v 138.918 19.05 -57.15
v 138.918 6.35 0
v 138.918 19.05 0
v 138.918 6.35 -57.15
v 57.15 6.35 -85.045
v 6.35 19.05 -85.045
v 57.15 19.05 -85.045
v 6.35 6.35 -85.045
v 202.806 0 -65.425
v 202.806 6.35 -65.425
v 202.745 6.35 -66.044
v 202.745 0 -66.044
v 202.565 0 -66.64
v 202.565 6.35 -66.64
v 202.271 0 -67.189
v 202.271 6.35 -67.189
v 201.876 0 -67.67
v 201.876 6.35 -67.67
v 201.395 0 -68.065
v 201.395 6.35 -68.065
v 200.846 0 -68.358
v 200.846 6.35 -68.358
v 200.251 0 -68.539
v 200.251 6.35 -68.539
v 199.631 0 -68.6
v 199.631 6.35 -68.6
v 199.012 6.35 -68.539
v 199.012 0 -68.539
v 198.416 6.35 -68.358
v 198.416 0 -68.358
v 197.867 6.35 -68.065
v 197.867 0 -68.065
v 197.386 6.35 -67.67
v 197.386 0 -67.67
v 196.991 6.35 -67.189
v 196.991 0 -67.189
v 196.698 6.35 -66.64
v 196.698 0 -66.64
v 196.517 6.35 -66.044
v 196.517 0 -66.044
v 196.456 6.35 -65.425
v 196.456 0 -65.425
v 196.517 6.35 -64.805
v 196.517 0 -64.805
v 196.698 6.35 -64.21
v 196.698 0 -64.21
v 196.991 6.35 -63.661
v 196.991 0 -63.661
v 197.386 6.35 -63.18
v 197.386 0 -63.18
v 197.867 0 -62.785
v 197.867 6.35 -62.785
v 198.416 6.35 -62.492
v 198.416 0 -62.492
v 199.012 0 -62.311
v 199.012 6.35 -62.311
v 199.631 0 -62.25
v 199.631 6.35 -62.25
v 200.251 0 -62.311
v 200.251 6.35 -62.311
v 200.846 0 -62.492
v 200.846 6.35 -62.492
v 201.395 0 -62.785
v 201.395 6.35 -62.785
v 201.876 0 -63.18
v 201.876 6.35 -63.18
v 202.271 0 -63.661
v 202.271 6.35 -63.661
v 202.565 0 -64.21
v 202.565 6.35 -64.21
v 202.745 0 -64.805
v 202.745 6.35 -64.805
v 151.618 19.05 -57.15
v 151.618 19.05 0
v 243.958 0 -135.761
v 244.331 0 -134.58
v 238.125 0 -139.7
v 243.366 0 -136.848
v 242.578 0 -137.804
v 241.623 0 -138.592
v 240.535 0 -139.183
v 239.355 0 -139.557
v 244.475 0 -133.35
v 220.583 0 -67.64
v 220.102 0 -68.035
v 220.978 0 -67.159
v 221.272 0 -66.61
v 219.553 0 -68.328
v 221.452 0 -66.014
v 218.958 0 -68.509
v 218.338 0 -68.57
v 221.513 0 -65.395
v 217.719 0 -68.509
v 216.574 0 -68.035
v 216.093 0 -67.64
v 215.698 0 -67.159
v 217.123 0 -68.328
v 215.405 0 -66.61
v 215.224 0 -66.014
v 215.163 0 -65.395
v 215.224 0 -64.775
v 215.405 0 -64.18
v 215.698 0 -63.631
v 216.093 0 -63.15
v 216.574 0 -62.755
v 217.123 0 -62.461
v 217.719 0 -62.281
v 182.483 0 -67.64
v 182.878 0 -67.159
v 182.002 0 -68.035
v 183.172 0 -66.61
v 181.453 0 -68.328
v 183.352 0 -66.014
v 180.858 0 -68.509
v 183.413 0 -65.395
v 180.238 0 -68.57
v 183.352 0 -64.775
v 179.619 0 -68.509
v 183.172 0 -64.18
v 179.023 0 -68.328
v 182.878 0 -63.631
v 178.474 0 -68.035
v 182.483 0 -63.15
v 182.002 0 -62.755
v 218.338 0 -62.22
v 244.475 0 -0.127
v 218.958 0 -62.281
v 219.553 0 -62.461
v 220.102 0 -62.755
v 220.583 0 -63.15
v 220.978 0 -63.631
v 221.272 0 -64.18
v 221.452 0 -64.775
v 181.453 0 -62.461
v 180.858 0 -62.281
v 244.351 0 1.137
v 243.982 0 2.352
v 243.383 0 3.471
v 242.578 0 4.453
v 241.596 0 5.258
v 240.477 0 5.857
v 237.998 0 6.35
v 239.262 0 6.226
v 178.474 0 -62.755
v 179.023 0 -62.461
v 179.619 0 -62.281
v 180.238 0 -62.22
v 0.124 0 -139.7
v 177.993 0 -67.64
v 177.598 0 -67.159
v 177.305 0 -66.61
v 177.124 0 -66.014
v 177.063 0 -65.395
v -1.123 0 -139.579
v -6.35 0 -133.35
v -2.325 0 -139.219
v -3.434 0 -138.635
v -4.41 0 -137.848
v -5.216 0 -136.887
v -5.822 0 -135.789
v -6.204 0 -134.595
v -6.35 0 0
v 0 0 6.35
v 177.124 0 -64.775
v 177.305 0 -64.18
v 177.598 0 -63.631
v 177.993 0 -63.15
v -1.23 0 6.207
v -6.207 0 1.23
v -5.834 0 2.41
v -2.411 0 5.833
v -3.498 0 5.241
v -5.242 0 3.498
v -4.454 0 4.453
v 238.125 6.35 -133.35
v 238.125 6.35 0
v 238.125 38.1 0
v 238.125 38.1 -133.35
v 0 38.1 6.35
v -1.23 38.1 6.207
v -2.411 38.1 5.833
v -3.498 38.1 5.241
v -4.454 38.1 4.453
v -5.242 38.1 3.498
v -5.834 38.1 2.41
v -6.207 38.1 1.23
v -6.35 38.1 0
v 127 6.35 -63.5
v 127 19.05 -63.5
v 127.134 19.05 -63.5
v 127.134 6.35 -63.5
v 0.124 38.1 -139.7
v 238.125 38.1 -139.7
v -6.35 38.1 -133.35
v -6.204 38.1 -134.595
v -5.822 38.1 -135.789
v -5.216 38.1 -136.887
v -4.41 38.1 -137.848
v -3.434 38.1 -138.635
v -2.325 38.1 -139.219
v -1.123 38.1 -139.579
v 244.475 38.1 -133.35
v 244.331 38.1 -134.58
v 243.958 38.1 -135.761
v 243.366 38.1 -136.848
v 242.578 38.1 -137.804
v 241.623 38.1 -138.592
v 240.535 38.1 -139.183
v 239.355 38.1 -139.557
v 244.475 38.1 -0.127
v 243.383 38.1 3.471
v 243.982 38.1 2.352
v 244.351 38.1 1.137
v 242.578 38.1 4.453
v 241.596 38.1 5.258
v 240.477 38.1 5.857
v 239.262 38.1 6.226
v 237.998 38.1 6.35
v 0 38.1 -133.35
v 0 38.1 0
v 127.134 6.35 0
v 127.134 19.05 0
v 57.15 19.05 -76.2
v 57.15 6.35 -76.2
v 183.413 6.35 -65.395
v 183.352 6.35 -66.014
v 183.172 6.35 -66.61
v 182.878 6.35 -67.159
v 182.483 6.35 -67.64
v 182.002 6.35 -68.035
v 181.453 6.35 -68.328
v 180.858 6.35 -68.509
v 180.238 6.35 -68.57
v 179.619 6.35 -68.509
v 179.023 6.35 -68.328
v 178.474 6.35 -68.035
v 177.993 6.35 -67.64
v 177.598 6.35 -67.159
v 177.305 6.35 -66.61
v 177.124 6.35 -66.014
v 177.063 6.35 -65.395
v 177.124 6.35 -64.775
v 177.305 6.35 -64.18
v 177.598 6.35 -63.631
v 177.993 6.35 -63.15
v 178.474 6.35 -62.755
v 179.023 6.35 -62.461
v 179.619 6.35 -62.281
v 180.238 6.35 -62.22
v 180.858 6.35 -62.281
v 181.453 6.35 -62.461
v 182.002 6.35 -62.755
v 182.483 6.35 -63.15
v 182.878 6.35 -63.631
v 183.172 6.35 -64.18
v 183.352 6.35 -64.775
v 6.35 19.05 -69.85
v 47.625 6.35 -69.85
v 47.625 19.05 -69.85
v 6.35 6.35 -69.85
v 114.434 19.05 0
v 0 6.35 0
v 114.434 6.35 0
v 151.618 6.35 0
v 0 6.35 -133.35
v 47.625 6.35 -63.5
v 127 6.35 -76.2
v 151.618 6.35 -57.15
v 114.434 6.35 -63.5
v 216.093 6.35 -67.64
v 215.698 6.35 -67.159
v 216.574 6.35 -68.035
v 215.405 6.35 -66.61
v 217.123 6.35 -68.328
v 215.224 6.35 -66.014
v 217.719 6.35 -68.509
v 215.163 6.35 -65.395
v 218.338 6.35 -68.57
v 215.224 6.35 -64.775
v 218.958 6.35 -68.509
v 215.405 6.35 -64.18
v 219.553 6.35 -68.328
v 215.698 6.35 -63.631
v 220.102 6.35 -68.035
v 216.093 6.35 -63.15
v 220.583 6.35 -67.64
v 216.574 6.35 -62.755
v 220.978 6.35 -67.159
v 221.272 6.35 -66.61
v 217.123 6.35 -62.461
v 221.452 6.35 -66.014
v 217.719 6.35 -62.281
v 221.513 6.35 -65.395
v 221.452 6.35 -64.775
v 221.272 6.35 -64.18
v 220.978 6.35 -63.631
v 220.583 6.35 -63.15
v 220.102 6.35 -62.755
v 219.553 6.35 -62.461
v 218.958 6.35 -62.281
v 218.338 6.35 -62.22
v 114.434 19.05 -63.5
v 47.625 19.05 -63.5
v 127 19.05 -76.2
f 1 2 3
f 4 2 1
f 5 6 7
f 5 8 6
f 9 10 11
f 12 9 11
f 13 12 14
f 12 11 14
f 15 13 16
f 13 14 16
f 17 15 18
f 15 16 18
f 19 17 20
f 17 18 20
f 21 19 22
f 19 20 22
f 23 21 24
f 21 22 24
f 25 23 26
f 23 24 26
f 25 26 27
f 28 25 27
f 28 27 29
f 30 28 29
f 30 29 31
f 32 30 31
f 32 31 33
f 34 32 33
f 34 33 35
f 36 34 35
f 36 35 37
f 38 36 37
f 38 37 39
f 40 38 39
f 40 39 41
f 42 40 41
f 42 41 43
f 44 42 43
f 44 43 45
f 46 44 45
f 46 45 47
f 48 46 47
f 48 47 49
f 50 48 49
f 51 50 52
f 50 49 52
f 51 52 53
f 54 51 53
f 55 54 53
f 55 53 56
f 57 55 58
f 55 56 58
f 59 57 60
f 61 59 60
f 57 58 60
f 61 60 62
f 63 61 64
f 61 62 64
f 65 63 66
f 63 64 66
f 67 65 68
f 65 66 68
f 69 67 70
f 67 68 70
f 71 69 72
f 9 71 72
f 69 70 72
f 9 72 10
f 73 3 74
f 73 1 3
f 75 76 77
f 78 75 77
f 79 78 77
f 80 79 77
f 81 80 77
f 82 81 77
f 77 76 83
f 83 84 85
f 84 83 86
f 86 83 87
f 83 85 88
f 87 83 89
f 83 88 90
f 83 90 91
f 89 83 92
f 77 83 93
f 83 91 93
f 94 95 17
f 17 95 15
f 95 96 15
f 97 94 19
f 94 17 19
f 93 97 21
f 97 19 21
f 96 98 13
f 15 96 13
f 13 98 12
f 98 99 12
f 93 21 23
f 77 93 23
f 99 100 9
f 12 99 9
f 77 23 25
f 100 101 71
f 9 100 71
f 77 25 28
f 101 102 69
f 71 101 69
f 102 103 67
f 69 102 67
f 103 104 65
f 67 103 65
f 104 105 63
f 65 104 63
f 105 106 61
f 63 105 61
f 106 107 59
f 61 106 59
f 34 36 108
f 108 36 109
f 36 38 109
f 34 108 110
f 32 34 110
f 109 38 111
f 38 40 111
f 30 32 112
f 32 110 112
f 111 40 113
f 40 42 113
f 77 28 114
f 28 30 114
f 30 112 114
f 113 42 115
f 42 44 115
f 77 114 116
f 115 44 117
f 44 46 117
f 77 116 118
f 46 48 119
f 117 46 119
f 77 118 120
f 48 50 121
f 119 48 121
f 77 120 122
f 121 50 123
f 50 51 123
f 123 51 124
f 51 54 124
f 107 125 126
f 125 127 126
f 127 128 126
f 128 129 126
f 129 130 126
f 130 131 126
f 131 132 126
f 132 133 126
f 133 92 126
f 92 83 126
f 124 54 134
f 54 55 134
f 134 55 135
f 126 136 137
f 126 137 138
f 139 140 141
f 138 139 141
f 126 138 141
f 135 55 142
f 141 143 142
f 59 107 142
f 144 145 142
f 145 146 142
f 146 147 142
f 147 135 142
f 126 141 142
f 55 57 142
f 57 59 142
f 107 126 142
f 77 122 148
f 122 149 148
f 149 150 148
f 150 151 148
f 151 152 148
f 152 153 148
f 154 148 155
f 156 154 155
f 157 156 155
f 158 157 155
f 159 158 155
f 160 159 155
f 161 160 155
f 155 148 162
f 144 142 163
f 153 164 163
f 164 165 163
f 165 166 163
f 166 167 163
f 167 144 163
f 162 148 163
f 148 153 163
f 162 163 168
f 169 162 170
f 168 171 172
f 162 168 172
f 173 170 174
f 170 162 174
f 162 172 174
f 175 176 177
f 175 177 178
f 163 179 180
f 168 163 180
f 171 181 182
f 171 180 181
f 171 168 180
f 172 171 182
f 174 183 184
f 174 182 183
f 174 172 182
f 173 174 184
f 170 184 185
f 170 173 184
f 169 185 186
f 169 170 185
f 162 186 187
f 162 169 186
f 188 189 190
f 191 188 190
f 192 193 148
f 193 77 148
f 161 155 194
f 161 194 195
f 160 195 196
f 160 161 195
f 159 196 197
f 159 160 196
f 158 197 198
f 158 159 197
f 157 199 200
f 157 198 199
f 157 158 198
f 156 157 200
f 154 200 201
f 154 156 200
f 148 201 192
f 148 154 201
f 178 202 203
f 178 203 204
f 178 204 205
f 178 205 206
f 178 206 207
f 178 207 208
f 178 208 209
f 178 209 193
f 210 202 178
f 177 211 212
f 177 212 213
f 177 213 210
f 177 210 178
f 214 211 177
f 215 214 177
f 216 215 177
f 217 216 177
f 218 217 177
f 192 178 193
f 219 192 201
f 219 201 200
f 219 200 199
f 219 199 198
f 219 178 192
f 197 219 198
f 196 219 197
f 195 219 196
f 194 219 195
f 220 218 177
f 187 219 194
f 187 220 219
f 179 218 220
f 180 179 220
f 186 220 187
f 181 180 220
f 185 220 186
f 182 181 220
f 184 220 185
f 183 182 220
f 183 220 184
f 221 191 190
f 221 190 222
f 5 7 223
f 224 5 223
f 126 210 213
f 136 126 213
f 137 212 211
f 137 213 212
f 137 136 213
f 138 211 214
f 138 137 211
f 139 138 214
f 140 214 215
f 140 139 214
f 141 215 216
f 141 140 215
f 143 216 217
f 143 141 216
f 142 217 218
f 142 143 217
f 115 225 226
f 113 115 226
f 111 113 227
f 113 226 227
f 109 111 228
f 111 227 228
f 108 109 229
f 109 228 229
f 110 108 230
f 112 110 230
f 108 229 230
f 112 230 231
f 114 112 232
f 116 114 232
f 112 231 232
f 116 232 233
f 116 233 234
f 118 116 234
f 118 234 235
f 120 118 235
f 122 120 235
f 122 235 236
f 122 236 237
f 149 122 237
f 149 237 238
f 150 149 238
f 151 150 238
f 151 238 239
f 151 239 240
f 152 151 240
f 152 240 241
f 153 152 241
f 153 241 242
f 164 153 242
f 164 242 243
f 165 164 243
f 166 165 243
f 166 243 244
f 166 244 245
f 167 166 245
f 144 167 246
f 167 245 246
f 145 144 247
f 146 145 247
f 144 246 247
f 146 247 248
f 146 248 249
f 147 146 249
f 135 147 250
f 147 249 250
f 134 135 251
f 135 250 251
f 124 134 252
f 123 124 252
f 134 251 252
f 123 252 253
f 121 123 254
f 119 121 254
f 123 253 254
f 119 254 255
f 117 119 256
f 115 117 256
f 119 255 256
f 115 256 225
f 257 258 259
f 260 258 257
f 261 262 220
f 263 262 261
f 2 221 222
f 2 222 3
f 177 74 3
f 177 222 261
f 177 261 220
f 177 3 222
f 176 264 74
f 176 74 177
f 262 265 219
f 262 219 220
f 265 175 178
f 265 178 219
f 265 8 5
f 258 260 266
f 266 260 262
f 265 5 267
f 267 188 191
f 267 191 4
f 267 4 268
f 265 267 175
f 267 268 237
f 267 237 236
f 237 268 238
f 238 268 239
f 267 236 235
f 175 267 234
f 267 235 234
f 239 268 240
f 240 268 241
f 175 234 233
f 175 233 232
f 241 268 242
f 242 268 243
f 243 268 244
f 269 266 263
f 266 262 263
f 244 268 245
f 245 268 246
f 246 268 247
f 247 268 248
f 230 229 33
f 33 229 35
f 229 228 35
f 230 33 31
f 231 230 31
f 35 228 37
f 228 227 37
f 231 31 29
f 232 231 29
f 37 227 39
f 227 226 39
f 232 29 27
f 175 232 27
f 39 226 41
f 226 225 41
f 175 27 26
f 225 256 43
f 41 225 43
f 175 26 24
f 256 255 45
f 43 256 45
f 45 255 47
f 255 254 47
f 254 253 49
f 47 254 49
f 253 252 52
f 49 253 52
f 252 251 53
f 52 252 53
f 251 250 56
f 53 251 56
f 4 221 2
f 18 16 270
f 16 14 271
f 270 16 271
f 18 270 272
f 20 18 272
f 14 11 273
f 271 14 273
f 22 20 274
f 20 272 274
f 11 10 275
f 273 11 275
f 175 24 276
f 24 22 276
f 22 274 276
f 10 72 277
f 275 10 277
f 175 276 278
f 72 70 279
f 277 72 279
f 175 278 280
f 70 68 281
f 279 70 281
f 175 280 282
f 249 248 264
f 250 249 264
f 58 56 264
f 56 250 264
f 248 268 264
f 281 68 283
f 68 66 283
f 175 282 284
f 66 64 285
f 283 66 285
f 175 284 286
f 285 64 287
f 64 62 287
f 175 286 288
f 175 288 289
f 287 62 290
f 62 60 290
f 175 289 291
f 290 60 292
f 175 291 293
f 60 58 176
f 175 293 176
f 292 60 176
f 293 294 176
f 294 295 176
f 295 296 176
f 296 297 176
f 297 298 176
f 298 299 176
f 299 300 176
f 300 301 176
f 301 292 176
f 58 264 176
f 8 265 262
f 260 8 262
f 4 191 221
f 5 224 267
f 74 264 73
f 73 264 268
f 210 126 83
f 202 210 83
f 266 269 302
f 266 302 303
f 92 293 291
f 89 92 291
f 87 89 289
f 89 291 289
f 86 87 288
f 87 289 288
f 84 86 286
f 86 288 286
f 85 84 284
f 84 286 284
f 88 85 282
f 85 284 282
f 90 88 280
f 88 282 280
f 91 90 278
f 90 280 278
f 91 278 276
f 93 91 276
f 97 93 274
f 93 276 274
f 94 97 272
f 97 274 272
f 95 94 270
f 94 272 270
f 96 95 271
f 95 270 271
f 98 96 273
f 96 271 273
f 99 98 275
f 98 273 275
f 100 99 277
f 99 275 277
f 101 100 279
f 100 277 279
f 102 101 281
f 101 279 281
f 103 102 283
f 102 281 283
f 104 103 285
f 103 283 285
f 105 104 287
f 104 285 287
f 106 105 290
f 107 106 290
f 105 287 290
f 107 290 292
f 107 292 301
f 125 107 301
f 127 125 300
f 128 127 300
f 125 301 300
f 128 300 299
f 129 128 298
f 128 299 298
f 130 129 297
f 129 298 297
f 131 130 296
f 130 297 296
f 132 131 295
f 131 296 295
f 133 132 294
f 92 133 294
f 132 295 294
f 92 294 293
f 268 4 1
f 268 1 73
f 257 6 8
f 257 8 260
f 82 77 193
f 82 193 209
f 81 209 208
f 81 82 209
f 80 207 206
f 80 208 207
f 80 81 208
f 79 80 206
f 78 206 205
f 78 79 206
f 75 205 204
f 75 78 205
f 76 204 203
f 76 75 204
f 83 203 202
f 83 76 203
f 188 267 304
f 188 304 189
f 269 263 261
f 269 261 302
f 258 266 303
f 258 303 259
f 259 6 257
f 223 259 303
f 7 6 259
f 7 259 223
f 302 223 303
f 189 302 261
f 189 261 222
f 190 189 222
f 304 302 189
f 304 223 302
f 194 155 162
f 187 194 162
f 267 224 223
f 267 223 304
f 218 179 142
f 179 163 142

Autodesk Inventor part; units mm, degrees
ref_plane "YZ Plane" through (0, 0, 0) normal (1, 0, 0) x (0, 1, 0)
ref_plane "XZ Plane" through (0, 0, 0) normal (0, 1, 0) x (-1, 0, 0)
ref_plane "XY Plane" through (0, 0, 0) normal (0, 0, 1) x (1, 0, 0)
sketch "Sketch1" plane through (0, 0, 0) normal (0, 1, 0) x (-1, 0, 0)
  line L0 (0, 0) -> (-238.125, 0)
  line L1 (-238.125, 0) -> (-238.125, -133.35)
  line L2 (-238.125, -133.35) -> (0, -133.35)
  line L3 (0, -133.35) -> (0, 0)
  line L4 (0, 6.35) -> (-237.998, 6.35)
  line L5 (-244.475, -0.127) -> (-244.475, -133.35)
  line L6 (-238.125, -139.7) -> (-0.1245, -139.7)
  line L7 (6.35, -133.35) -> (6.35, 0)
  arc A0 (-0.1245, -139.7) -> (6.35, -133.35) centre (-0.1245, -133.2243) ccw
  arc A1 (6.35, 0) -> (-0.1245, 6.35) centre (-0.1258, -0.127) ccw
  arc A2 (-244.475, -133.2243) -> (-238.125, -139.7) centre (-237.998, -133.2242) ccw
  arc A3 (-237.998, 6.35) -> (-244.475, -0.127) centre (-237.998, -0.127) ccw
  dimension "d0" = 238.125
  dimension "d1" = 133.35
  dimension "d2" = 6.35
  dimension "d9" = 6.477
  dimension "d10" = 6.477
  dimension "d11" = 6.477
extrude "Extrusion1" add sketch "Sketch1" along normal blind 38.1
sketch "Sketch2" plane through (0, 0, 0) normal (0, -1, 0) x (1, 0, 0)
  line L0 (0, 0) -> (238.125, 0)
  line L1 (238.125, 0) -> (238.125, -133.35)
  line L2 (238.125, -133.35) -> (0, -133.35)
  line L3 (0, -133.35) -> (0, 0)
  dimension "d5" = 238.125
  dimension "d6" = 133.35
extrude "Extrusion2" add sketch "Sketch2" against normal blind 6.35
sketch "Sketch7" plane through (0, 6.35, 0) normal (0, 1, 0) x (1, 0, 0)
  line L0 (237.998, 0) -> (155.448, 0)
  line L1 (238.125, 0) -> (0, 0) projected
  line L2 (155.448, 0) -> (155.448, 57.15)
  line L3 (155.448, 57.15) -> (237.998, 57.15)
  circle A0 centre (218.3382, 65.3946) radius 3.175
  circle A1 centre (199.6313, 65.4249) radius 3.175
  line L4 (218.3382, 65.3946) -> (180.2382, 65.3946)
  circle A2 centre (180.2382, 65.3946) radius 3.175
  dimension "d31" = 82.55
  dimension "d32" = 57.15
  dimension "d33" = 6.35
  dimension "d36" = 6.35
  dimension "d37" = 38.1
  dimension "d38" = 6.35
extrude "Extrusion4" cut sketch "Sketch7" against normal blind 6.35
sketch "Sketch11" plane through (0, 6.35, 0) normal (0, 1, 0) x (1, 0, 0)
  line L0 (57.15, 78.6953) -> (0, 78.6953)
  line L1 (47.625, 76.2) -> (127, 76.2) projected
  line L2 (47.625, 76.2) -> (127, 76.2)
  line L3 (127, 76.2) -> (127, 63.5)
  line L4 (127, 63.5) -> (47.625, 63.5)
  line L5 (47.625, 63.5) -> (47.625, 76.2)
  line L6 (114.4338, 63.5) -> (127.1338, 63.5)
  line L7 (127.1338, 63.5) -> (127.1338, 0)
  line L8 (127.1338, 0) -> (114.4338, 0)
  line L9 (114.4338, 0) -> (114.4338, 63.5)
  line L10 (238.125, 0) -> (0, 0) projected
  line L11 (0, 0) -> (0, 82.55)
  line L12 (0, 0) -> (0, 133.35) projected
  line L13 (0, 82.55) -> (57.15, 82.55)
  line L14 (57.15, 82.55) -> (57.15, 0)
  line L15 (0, 78.6953) -> (47.625, 78.6953)
  line L16 (47.625, 78.6953) -> (47.625, 69.85)
  line L17 (47.625, 69.85) -> (0, 69.85)
  line L18 (0, 69.85) -> (0, 78.6953)
  line L19 (57.15, 78.6953) -> (0, 78.6953)
  line L20 (0, 78.6953) -> (0, 85.0453)
  line L21 (0, 85.0453) -> (57.15, 85.0453)
  line L22 (57.15, 85.0453) -> (57.15, 78.6953)
  point P0 (0, 97.7453)
  point P1 (0, 69.85)
  dimension "d59" = 79.375
  dimension "d60" = 12.7
  dimension "d61" = 12.7
  dimension "d62" = 63.5
  dimension "d70" = 82.55
  dimension "d71" = 6.35
extrude "Extrusion7" add sketch "Sketch11" along normal blind 12.7 contours L0 L11 L13 L14 | L16 L5 L17 L11 L0 | L13 L12 L21 L22 | L14 L4 L5 L1 | L1 L3 L4 L14 | L6 L7 L8 L9 L4
sketch "Sketch12" plane through (0, 6.35, 0) normal (0, 1, 0) x (1, 0, 0)
  line L0 (238.125, 0) -> (0, 0) projected
  line L1 (238.125, 0) -> (155.575, 0)
  line L2 (151.6176, 0) -> (151.6176, 57.15)
  line L3 (155.575, 57.15) -> (238.125, 57.15)
  line L4 (238.125, 57.15) -> (238.125, 0)
  line L5 (151.6176, 0) -> (138.9176, 0)
  line L6 (138.9176, 0) -> (138.9176, 57.15)
  line L7 (138.9176, 57.15) -> (151.6176, 57.15)
  line L8 (155.575, 57.15) -> (155.575, 0)
  point P0 (151.6176, 57.15)
  point P1 (151.6176, 0)
  dimension "d65" = 82.55
  dimension "d66" = 57.15
  dimension "d67" = 12.7
extrude "Extrusion8" add sketch "Sketch12" along normal blind 12.7 contours L0 L6 L7 L2
sketch "Sketch13" plane through (0, 19.05, 0) normal (0, 1, 0) x (1, 0, 0)
  line L0 (0, 85.0453) -> (57.15, 85.0453) projected
  line L1 (47.625, 69.85) -> (0, 69.85) projected
  line L2 (0, 85.0453) -> (6.35, 85.0453)
  line L3 (6.35, 85.0453) -> (6.35, 69.85)
  line L4 (6.35, 69.85) -> (0, 69.85)
  line L5 (0, 69.85) -> (0, 85.0453)
  point P0 (0, 0)
  dimension "d72" = 6.35
extrude "Extrusion9" cut sketch "Sketch13" against normal blind 12.7
sketch "Sketch14" plane through (0, 19.05, 0) normal (0, 1, 0) x (1, 0, 0)
  line L0 (47.625, 78.6953) -> (47.625, 76.2) projected
  line L1 (47.625, 78.6953) -> (57.15, 78.6953)
  line L2 (57.15, 78.6953) -> (57.15, 76.0675)
  line L3 (57.15, 76.0675) -> (47.625, 76.0675)
  line L4 (47.625, 76.0675) -> (47.625, 78.6953)
  point P0 (0, 0)
extrude "Extrusion10" add sketch "Sketch14" against normal blind 12.7
sketch "Sketch15" plane through (0, 19.05, 0) normal (0, 1, 0) x (1, 0, 0)
  point P0 (0, 0)
equation "\"d34\" = d38"
properties part number "SimpleElectronicBox"
